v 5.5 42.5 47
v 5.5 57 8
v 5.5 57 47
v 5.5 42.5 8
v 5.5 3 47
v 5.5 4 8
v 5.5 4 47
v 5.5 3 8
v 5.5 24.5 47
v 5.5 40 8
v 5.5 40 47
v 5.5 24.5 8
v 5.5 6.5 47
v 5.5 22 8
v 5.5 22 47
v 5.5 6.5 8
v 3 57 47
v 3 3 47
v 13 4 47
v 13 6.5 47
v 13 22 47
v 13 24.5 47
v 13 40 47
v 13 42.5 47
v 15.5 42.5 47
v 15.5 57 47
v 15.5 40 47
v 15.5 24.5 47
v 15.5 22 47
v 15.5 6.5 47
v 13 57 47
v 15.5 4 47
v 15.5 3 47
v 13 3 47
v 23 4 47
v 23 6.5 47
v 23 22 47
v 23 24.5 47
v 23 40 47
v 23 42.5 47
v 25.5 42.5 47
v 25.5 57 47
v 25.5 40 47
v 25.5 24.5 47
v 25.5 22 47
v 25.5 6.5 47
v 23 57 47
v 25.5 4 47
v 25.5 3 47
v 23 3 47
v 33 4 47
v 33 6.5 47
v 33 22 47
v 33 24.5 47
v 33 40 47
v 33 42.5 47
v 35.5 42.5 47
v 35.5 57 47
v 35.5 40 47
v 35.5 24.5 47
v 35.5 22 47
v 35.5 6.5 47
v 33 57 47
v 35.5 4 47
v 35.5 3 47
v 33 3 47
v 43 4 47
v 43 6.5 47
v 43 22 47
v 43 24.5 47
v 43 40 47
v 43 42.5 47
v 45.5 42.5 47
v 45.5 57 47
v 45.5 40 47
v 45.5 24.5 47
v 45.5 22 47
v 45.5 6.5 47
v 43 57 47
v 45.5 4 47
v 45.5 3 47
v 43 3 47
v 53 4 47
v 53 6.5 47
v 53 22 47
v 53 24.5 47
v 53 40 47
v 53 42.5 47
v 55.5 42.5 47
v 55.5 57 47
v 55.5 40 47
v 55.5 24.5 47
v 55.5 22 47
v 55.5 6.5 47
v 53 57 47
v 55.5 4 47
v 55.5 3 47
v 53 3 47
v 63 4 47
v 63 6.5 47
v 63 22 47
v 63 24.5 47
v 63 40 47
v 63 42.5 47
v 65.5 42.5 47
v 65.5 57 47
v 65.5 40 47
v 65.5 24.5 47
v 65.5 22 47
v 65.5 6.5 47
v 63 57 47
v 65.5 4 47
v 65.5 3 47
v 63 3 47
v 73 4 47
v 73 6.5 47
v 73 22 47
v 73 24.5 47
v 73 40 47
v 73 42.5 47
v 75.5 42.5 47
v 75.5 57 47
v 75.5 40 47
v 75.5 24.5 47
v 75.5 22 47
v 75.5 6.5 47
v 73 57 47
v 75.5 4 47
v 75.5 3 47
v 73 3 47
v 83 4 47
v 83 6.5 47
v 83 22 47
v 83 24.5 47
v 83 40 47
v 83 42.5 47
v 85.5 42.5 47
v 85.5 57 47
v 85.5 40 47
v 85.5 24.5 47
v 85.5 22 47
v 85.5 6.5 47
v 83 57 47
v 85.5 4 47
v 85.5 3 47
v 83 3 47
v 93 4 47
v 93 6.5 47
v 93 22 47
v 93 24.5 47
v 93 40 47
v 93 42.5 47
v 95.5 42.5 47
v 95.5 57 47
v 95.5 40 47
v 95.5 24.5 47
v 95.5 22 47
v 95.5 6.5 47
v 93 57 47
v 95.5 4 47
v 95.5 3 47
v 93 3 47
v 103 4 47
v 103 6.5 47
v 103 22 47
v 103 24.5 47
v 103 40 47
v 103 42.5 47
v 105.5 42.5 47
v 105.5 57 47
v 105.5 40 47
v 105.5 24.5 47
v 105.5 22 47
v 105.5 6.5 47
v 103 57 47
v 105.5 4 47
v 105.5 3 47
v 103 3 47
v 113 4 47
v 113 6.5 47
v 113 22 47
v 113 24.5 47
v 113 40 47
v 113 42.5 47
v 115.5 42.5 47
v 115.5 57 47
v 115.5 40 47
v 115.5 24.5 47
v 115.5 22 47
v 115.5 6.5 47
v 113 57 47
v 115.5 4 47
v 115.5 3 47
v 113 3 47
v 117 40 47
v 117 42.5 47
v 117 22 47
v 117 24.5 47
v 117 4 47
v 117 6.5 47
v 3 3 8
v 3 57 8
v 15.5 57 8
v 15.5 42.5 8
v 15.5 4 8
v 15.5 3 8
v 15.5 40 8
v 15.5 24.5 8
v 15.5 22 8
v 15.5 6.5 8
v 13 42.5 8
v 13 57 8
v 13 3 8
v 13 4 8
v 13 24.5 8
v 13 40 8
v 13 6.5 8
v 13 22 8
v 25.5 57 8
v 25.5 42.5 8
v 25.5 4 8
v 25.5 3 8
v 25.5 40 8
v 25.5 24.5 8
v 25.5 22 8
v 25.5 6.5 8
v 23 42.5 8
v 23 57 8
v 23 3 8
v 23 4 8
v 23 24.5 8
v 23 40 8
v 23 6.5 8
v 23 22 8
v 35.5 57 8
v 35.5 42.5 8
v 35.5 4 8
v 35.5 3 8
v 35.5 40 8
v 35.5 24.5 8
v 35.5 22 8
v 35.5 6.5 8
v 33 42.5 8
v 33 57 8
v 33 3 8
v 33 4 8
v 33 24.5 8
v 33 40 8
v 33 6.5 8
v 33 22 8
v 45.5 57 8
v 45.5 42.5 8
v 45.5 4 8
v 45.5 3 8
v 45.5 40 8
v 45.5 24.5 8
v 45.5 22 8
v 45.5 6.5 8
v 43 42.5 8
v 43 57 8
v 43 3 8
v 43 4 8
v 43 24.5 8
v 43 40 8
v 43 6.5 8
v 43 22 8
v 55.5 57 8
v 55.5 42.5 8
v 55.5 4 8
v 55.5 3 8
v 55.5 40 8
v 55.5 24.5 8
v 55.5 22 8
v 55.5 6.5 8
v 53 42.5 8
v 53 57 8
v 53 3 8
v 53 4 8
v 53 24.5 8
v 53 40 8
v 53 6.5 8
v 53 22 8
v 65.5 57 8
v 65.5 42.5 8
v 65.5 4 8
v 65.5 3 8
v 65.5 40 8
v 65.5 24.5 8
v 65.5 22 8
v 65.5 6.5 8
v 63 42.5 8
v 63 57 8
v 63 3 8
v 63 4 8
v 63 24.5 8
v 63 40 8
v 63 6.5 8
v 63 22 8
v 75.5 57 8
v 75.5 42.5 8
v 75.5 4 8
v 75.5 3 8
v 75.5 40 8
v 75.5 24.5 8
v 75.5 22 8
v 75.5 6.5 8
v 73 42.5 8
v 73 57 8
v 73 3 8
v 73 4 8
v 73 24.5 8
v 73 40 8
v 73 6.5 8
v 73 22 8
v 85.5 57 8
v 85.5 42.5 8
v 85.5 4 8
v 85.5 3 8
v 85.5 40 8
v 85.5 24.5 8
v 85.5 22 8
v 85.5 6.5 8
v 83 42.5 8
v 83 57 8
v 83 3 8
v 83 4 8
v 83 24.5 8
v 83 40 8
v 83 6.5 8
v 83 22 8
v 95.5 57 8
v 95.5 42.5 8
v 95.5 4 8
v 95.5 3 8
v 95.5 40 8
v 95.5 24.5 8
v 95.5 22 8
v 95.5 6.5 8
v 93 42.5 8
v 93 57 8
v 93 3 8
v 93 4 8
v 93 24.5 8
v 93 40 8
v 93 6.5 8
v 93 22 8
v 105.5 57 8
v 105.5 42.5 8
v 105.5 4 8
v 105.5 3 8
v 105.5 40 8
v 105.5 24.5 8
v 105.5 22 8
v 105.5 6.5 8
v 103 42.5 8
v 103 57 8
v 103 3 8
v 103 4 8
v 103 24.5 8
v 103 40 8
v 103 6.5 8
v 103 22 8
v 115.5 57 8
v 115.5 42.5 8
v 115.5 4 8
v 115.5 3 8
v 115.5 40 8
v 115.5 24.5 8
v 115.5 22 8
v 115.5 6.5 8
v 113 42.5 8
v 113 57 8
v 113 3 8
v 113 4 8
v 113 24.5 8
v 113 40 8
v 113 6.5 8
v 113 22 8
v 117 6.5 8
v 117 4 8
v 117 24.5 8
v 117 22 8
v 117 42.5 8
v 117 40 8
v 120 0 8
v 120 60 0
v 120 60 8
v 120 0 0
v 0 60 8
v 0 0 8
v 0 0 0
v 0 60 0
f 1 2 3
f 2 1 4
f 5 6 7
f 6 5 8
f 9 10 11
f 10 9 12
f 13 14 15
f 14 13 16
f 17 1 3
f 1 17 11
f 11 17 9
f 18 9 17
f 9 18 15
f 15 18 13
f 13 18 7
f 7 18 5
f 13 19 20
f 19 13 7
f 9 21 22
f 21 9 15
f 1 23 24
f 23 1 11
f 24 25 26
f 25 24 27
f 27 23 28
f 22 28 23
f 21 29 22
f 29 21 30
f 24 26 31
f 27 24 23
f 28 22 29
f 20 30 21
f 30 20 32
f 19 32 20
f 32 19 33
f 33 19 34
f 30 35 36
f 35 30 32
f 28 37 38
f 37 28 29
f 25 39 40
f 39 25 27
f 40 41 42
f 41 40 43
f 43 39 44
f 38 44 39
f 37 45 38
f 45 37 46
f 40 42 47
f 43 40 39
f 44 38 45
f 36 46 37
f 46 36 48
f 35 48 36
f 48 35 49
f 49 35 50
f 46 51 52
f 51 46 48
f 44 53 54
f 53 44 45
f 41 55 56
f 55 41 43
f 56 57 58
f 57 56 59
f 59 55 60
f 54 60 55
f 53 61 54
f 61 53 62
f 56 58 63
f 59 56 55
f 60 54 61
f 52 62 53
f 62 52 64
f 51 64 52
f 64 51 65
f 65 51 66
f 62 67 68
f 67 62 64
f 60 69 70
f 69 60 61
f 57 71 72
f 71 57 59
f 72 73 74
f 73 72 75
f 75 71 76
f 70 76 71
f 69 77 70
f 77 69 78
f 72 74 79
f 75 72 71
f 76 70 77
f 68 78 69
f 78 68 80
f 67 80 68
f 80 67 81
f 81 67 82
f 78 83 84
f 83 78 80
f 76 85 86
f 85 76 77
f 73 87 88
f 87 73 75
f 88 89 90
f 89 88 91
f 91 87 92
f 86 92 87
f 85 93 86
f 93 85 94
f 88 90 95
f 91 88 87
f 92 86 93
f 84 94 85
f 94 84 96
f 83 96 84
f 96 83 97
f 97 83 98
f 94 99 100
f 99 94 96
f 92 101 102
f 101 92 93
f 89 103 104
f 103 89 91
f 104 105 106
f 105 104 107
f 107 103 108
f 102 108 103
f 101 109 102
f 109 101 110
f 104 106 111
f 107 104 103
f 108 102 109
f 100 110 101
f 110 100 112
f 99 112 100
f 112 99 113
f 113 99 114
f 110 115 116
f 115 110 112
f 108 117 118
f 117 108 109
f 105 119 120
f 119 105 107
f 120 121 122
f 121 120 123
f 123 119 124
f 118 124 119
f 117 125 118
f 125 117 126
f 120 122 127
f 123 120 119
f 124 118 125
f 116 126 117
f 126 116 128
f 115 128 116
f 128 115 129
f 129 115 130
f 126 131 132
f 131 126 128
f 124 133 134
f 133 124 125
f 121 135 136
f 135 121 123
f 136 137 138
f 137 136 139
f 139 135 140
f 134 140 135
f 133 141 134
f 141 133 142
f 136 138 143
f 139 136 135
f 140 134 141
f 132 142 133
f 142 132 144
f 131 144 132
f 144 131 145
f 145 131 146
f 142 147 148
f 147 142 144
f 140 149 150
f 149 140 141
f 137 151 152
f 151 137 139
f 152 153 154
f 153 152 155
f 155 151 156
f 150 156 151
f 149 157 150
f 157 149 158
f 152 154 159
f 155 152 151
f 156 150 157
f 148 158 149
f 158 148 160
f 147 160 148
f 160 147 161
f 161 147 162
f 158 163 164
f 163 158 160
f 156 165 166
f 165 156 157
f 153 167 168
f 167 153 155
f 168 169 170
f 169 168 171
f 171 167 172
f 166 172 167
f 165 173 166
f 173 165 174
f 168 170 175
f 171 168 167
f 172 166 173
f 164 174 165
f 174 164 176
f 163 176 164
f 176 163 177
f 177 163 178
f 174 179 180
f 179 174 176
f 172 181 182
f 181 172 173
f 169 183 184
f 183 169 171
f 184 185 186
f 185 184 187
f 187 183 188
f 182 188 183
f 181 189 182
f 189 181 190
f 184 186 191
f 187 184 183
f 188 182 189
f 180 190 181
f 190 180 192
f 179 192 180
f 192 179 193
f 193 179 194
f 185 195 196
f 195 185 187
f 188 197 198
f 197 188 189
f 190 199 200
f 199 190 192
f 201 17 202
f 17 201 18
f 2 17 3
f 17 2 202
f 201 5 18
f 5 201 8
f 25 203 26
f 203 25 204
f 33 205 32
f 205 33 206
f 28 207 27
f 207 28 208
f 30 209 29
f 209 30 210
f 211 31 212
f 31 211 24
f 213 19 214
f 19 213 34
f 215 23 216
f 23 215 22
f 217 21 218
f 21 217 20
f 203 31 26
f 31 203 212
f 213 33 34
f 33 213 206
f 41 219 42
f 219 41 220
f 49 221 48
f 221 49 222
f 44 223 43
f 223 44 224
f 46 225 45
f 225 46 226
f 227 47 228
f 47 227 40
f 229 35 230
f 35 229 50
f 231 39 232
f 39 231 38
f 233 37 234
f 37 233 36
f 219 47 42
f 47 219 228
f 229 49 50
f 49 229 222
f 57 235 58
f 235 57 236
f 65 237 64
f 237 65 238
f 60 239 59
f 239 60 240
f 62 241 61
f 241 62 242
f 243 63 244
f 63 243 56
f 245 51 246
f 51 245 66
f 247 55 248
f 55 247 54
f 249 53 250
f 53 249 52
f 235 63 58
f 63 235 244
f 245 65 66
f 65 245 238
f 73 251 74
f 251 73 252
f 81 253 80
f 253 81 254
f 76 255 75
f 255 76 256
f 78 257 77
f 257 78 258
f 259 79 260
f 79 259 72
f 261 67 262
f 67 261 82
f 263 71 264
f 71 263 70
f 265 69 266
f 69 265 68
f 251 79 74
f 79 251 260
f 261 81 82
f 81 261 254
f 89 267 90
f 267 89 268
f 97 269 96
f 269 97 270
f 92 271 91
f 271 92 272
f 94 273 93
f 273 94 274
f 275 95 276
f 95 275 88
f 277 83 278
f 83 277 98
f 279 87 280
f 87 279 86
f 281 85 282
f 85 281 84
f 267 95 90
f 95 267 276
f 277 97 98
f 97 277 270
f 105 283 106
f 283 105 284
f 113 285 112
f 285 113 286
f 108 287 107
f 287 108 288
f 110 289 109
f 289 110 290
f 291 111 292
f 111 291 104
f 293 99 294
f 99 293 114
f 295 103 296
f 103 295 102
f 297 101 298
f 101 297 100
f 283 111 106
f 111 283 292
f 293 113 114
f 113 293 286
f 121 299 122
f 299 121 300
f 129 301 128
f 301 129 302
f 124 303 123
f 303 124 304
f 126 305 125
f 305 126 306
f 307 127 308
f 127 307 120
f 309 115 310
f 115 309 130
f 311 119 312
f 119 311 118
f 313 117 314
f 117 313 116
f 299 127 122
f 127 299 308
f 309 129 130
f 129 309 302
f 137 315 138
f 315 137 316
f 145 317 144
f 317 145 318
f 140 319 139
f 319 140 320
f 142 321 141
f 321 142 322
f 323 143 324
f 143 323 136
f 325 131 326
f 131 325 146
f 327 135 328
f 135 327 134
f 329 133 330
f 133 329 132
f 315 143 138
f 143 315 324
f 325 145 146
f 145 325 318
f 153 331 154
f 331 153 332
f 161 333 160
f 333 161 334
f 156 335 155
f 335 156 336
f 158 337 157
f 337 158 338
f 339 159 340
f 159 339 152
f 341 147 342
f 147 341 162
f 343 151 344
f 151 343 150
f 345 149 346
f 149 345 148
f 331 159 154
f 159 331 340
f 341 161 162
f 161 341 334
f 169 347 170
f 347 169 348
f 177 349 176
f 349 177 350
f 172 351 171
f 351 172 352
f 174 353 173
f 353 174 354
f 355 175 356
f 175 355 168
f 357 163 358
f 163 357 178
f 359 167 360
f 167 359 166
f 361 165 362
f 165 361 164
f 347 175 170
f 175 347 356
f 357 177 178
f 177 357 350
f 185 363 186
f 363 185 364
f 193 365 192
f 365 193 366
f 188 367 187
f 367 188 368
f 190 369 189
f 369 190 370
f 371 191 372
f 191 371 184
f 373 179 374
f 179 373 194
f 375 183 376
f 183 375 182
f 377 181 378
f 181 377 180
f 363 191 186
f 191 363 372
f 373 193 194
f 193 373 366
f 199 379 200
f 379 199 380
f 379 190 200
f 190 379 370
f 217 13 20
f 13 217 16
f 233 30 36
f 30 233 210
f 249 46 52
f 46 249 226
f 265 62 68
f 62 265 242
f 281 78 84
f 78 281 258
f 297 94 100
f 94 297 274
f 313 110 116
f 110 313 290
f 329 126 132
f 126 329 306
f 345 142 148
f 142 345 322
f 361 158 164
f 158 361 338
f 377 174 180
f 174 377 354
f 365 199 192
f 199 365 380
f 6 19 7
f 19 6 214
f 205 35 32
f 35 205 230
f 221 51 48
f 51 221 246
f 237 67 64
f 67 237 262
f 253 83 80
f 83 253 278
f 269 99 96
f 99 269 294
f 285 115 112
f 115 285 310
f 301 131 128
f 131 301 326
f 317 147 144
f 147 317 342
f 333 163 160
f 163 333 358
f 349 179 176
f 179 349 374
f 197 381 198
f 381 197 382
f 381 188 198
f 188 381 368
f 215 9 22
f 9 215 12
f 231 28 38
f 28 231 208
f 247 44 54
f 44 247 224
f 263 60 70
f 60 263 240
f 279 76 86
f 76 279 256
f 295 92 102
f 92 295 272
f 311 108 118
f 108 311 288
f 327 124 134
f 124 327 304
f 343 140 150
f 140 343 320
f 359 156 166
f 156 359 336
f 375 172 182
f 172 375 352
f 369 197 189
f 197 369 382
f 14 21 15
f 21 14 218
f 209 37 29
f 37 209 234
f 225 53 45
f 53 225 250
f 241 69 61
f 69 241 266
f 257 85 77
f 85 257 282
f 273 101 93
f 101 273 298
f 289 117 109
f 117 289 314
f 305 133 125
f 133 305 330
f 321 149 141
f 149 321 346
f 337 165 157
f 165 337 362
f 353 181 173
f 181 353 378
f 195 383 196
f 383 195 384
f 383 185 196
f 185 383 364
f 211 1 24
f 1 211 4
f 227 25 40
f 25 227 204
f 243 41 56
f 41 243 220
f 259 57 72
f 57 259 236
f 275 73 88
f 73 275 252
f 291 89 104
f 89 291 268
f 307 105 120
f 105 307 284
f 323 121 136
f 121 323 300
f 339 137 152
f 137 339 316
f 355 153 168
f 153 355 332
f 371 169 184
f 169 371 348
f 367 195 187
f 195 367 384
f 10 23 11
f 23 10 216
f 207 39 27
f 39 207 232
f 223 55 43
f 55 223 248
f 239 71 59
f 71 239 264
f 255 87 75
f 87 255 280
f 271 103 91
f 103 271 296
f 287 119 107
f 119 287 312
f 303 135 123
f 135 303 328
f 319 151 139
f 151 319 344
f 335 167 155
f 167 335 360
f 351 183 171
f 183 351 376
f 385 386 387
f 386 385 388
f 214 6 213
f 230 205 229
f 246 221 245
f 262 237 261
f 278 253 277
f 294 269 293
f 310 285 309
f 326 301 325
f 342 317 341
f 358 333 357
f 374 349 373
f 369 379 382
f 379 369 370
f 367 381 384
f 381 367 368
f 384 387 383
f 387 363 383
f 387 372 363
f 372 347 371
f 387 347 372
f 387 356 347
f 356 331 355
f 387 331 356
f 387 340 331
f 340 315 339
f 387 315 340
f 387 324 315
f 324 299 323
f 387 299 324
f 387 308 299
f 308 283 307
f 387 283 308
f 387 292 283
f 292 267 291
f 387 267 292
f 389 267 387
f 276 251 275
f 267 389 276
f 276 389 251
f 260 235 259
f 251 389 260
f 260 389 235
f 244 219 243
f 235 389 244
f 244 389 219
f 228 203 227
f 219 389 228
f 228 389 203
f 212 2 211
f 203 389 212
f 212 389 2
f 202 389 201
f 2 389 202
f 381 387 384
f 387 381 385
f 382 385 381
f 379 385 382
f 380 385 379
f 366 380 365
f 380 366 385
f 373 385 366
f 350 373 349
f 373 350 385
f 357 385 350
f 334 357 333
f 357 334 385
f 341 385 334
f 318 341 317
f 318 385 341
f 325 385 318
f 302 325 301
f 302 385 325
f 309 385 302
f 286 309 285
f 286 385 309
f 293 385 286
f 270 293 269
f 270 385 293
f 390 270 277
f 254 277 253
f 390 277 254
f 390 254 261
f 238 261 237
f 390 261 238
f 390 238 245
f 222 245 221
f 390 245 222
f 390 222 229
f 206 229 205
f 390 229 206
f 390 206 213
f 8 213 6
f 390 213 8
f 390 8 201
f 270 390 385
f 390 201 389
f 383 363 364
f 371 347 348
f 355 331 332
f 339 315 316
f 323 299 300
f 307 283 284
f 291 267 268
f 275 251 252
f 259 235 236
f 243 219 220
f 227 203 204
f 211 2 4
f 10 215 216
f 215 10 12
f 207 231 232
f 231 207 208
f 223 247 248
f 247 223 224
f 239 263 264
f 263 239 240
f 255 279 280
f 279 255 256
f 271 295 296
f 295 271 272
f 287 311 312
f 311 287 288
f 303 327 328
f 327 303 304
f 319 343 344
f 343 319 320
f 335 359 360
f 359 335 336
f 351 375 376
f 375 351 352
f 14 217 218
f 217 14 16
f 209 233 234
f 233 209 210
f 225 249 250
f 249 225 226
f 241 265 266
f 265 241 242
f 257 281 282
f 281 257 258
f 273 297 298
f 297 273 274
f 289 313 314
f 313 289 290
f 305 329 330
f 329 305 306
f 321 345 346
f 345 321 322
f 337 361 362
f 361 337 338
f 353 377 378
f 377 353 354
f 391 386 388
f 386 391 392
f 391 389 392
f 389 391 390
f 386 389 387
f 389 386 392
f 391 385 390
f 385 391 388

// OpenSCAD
$fn = 32;

// ----------------------------------------------------------------------
// Heatsink: cross fin block
// ----------------------------------------------------------------------

// --- parameters (mm) ---
base_l = 120;             // base length, X
base_w = 60;              // base width, Y
base_t = 8;               // base plate thickness
fin_h = 40;               // fin height above the base
fin_t = 2.5;              // fin thickness
edge = 3;                 // margin from the base ends
pitch = 10;               // fin pitch
rib_pitch = 18;           // cross rib pitch

n_fins = floor((base_l - 2 * edge - fin_t) / pitch) + 1;  // fin count
total_h = base_t + fin_h - 1;  // overall height
n_ribs = floor((base_w - 2 * edge) / rib_pitch);  // rib count

union() {
  cube([base_l, base_w, base_t]);
  for (i = [0 : n_fins - 1])
    translate([edge + i * pitch, edge, base_t - 1])
      cube([fin_t, base_w - 2 * edge, fin_h]);
  for (i = [0 : n_ribs - 1])
    translate([edge, edge + 1 + i * rib_pitch, base_t - 1])
      cube([base_l - 2 * edge, fin_t, fin_h]);
}
